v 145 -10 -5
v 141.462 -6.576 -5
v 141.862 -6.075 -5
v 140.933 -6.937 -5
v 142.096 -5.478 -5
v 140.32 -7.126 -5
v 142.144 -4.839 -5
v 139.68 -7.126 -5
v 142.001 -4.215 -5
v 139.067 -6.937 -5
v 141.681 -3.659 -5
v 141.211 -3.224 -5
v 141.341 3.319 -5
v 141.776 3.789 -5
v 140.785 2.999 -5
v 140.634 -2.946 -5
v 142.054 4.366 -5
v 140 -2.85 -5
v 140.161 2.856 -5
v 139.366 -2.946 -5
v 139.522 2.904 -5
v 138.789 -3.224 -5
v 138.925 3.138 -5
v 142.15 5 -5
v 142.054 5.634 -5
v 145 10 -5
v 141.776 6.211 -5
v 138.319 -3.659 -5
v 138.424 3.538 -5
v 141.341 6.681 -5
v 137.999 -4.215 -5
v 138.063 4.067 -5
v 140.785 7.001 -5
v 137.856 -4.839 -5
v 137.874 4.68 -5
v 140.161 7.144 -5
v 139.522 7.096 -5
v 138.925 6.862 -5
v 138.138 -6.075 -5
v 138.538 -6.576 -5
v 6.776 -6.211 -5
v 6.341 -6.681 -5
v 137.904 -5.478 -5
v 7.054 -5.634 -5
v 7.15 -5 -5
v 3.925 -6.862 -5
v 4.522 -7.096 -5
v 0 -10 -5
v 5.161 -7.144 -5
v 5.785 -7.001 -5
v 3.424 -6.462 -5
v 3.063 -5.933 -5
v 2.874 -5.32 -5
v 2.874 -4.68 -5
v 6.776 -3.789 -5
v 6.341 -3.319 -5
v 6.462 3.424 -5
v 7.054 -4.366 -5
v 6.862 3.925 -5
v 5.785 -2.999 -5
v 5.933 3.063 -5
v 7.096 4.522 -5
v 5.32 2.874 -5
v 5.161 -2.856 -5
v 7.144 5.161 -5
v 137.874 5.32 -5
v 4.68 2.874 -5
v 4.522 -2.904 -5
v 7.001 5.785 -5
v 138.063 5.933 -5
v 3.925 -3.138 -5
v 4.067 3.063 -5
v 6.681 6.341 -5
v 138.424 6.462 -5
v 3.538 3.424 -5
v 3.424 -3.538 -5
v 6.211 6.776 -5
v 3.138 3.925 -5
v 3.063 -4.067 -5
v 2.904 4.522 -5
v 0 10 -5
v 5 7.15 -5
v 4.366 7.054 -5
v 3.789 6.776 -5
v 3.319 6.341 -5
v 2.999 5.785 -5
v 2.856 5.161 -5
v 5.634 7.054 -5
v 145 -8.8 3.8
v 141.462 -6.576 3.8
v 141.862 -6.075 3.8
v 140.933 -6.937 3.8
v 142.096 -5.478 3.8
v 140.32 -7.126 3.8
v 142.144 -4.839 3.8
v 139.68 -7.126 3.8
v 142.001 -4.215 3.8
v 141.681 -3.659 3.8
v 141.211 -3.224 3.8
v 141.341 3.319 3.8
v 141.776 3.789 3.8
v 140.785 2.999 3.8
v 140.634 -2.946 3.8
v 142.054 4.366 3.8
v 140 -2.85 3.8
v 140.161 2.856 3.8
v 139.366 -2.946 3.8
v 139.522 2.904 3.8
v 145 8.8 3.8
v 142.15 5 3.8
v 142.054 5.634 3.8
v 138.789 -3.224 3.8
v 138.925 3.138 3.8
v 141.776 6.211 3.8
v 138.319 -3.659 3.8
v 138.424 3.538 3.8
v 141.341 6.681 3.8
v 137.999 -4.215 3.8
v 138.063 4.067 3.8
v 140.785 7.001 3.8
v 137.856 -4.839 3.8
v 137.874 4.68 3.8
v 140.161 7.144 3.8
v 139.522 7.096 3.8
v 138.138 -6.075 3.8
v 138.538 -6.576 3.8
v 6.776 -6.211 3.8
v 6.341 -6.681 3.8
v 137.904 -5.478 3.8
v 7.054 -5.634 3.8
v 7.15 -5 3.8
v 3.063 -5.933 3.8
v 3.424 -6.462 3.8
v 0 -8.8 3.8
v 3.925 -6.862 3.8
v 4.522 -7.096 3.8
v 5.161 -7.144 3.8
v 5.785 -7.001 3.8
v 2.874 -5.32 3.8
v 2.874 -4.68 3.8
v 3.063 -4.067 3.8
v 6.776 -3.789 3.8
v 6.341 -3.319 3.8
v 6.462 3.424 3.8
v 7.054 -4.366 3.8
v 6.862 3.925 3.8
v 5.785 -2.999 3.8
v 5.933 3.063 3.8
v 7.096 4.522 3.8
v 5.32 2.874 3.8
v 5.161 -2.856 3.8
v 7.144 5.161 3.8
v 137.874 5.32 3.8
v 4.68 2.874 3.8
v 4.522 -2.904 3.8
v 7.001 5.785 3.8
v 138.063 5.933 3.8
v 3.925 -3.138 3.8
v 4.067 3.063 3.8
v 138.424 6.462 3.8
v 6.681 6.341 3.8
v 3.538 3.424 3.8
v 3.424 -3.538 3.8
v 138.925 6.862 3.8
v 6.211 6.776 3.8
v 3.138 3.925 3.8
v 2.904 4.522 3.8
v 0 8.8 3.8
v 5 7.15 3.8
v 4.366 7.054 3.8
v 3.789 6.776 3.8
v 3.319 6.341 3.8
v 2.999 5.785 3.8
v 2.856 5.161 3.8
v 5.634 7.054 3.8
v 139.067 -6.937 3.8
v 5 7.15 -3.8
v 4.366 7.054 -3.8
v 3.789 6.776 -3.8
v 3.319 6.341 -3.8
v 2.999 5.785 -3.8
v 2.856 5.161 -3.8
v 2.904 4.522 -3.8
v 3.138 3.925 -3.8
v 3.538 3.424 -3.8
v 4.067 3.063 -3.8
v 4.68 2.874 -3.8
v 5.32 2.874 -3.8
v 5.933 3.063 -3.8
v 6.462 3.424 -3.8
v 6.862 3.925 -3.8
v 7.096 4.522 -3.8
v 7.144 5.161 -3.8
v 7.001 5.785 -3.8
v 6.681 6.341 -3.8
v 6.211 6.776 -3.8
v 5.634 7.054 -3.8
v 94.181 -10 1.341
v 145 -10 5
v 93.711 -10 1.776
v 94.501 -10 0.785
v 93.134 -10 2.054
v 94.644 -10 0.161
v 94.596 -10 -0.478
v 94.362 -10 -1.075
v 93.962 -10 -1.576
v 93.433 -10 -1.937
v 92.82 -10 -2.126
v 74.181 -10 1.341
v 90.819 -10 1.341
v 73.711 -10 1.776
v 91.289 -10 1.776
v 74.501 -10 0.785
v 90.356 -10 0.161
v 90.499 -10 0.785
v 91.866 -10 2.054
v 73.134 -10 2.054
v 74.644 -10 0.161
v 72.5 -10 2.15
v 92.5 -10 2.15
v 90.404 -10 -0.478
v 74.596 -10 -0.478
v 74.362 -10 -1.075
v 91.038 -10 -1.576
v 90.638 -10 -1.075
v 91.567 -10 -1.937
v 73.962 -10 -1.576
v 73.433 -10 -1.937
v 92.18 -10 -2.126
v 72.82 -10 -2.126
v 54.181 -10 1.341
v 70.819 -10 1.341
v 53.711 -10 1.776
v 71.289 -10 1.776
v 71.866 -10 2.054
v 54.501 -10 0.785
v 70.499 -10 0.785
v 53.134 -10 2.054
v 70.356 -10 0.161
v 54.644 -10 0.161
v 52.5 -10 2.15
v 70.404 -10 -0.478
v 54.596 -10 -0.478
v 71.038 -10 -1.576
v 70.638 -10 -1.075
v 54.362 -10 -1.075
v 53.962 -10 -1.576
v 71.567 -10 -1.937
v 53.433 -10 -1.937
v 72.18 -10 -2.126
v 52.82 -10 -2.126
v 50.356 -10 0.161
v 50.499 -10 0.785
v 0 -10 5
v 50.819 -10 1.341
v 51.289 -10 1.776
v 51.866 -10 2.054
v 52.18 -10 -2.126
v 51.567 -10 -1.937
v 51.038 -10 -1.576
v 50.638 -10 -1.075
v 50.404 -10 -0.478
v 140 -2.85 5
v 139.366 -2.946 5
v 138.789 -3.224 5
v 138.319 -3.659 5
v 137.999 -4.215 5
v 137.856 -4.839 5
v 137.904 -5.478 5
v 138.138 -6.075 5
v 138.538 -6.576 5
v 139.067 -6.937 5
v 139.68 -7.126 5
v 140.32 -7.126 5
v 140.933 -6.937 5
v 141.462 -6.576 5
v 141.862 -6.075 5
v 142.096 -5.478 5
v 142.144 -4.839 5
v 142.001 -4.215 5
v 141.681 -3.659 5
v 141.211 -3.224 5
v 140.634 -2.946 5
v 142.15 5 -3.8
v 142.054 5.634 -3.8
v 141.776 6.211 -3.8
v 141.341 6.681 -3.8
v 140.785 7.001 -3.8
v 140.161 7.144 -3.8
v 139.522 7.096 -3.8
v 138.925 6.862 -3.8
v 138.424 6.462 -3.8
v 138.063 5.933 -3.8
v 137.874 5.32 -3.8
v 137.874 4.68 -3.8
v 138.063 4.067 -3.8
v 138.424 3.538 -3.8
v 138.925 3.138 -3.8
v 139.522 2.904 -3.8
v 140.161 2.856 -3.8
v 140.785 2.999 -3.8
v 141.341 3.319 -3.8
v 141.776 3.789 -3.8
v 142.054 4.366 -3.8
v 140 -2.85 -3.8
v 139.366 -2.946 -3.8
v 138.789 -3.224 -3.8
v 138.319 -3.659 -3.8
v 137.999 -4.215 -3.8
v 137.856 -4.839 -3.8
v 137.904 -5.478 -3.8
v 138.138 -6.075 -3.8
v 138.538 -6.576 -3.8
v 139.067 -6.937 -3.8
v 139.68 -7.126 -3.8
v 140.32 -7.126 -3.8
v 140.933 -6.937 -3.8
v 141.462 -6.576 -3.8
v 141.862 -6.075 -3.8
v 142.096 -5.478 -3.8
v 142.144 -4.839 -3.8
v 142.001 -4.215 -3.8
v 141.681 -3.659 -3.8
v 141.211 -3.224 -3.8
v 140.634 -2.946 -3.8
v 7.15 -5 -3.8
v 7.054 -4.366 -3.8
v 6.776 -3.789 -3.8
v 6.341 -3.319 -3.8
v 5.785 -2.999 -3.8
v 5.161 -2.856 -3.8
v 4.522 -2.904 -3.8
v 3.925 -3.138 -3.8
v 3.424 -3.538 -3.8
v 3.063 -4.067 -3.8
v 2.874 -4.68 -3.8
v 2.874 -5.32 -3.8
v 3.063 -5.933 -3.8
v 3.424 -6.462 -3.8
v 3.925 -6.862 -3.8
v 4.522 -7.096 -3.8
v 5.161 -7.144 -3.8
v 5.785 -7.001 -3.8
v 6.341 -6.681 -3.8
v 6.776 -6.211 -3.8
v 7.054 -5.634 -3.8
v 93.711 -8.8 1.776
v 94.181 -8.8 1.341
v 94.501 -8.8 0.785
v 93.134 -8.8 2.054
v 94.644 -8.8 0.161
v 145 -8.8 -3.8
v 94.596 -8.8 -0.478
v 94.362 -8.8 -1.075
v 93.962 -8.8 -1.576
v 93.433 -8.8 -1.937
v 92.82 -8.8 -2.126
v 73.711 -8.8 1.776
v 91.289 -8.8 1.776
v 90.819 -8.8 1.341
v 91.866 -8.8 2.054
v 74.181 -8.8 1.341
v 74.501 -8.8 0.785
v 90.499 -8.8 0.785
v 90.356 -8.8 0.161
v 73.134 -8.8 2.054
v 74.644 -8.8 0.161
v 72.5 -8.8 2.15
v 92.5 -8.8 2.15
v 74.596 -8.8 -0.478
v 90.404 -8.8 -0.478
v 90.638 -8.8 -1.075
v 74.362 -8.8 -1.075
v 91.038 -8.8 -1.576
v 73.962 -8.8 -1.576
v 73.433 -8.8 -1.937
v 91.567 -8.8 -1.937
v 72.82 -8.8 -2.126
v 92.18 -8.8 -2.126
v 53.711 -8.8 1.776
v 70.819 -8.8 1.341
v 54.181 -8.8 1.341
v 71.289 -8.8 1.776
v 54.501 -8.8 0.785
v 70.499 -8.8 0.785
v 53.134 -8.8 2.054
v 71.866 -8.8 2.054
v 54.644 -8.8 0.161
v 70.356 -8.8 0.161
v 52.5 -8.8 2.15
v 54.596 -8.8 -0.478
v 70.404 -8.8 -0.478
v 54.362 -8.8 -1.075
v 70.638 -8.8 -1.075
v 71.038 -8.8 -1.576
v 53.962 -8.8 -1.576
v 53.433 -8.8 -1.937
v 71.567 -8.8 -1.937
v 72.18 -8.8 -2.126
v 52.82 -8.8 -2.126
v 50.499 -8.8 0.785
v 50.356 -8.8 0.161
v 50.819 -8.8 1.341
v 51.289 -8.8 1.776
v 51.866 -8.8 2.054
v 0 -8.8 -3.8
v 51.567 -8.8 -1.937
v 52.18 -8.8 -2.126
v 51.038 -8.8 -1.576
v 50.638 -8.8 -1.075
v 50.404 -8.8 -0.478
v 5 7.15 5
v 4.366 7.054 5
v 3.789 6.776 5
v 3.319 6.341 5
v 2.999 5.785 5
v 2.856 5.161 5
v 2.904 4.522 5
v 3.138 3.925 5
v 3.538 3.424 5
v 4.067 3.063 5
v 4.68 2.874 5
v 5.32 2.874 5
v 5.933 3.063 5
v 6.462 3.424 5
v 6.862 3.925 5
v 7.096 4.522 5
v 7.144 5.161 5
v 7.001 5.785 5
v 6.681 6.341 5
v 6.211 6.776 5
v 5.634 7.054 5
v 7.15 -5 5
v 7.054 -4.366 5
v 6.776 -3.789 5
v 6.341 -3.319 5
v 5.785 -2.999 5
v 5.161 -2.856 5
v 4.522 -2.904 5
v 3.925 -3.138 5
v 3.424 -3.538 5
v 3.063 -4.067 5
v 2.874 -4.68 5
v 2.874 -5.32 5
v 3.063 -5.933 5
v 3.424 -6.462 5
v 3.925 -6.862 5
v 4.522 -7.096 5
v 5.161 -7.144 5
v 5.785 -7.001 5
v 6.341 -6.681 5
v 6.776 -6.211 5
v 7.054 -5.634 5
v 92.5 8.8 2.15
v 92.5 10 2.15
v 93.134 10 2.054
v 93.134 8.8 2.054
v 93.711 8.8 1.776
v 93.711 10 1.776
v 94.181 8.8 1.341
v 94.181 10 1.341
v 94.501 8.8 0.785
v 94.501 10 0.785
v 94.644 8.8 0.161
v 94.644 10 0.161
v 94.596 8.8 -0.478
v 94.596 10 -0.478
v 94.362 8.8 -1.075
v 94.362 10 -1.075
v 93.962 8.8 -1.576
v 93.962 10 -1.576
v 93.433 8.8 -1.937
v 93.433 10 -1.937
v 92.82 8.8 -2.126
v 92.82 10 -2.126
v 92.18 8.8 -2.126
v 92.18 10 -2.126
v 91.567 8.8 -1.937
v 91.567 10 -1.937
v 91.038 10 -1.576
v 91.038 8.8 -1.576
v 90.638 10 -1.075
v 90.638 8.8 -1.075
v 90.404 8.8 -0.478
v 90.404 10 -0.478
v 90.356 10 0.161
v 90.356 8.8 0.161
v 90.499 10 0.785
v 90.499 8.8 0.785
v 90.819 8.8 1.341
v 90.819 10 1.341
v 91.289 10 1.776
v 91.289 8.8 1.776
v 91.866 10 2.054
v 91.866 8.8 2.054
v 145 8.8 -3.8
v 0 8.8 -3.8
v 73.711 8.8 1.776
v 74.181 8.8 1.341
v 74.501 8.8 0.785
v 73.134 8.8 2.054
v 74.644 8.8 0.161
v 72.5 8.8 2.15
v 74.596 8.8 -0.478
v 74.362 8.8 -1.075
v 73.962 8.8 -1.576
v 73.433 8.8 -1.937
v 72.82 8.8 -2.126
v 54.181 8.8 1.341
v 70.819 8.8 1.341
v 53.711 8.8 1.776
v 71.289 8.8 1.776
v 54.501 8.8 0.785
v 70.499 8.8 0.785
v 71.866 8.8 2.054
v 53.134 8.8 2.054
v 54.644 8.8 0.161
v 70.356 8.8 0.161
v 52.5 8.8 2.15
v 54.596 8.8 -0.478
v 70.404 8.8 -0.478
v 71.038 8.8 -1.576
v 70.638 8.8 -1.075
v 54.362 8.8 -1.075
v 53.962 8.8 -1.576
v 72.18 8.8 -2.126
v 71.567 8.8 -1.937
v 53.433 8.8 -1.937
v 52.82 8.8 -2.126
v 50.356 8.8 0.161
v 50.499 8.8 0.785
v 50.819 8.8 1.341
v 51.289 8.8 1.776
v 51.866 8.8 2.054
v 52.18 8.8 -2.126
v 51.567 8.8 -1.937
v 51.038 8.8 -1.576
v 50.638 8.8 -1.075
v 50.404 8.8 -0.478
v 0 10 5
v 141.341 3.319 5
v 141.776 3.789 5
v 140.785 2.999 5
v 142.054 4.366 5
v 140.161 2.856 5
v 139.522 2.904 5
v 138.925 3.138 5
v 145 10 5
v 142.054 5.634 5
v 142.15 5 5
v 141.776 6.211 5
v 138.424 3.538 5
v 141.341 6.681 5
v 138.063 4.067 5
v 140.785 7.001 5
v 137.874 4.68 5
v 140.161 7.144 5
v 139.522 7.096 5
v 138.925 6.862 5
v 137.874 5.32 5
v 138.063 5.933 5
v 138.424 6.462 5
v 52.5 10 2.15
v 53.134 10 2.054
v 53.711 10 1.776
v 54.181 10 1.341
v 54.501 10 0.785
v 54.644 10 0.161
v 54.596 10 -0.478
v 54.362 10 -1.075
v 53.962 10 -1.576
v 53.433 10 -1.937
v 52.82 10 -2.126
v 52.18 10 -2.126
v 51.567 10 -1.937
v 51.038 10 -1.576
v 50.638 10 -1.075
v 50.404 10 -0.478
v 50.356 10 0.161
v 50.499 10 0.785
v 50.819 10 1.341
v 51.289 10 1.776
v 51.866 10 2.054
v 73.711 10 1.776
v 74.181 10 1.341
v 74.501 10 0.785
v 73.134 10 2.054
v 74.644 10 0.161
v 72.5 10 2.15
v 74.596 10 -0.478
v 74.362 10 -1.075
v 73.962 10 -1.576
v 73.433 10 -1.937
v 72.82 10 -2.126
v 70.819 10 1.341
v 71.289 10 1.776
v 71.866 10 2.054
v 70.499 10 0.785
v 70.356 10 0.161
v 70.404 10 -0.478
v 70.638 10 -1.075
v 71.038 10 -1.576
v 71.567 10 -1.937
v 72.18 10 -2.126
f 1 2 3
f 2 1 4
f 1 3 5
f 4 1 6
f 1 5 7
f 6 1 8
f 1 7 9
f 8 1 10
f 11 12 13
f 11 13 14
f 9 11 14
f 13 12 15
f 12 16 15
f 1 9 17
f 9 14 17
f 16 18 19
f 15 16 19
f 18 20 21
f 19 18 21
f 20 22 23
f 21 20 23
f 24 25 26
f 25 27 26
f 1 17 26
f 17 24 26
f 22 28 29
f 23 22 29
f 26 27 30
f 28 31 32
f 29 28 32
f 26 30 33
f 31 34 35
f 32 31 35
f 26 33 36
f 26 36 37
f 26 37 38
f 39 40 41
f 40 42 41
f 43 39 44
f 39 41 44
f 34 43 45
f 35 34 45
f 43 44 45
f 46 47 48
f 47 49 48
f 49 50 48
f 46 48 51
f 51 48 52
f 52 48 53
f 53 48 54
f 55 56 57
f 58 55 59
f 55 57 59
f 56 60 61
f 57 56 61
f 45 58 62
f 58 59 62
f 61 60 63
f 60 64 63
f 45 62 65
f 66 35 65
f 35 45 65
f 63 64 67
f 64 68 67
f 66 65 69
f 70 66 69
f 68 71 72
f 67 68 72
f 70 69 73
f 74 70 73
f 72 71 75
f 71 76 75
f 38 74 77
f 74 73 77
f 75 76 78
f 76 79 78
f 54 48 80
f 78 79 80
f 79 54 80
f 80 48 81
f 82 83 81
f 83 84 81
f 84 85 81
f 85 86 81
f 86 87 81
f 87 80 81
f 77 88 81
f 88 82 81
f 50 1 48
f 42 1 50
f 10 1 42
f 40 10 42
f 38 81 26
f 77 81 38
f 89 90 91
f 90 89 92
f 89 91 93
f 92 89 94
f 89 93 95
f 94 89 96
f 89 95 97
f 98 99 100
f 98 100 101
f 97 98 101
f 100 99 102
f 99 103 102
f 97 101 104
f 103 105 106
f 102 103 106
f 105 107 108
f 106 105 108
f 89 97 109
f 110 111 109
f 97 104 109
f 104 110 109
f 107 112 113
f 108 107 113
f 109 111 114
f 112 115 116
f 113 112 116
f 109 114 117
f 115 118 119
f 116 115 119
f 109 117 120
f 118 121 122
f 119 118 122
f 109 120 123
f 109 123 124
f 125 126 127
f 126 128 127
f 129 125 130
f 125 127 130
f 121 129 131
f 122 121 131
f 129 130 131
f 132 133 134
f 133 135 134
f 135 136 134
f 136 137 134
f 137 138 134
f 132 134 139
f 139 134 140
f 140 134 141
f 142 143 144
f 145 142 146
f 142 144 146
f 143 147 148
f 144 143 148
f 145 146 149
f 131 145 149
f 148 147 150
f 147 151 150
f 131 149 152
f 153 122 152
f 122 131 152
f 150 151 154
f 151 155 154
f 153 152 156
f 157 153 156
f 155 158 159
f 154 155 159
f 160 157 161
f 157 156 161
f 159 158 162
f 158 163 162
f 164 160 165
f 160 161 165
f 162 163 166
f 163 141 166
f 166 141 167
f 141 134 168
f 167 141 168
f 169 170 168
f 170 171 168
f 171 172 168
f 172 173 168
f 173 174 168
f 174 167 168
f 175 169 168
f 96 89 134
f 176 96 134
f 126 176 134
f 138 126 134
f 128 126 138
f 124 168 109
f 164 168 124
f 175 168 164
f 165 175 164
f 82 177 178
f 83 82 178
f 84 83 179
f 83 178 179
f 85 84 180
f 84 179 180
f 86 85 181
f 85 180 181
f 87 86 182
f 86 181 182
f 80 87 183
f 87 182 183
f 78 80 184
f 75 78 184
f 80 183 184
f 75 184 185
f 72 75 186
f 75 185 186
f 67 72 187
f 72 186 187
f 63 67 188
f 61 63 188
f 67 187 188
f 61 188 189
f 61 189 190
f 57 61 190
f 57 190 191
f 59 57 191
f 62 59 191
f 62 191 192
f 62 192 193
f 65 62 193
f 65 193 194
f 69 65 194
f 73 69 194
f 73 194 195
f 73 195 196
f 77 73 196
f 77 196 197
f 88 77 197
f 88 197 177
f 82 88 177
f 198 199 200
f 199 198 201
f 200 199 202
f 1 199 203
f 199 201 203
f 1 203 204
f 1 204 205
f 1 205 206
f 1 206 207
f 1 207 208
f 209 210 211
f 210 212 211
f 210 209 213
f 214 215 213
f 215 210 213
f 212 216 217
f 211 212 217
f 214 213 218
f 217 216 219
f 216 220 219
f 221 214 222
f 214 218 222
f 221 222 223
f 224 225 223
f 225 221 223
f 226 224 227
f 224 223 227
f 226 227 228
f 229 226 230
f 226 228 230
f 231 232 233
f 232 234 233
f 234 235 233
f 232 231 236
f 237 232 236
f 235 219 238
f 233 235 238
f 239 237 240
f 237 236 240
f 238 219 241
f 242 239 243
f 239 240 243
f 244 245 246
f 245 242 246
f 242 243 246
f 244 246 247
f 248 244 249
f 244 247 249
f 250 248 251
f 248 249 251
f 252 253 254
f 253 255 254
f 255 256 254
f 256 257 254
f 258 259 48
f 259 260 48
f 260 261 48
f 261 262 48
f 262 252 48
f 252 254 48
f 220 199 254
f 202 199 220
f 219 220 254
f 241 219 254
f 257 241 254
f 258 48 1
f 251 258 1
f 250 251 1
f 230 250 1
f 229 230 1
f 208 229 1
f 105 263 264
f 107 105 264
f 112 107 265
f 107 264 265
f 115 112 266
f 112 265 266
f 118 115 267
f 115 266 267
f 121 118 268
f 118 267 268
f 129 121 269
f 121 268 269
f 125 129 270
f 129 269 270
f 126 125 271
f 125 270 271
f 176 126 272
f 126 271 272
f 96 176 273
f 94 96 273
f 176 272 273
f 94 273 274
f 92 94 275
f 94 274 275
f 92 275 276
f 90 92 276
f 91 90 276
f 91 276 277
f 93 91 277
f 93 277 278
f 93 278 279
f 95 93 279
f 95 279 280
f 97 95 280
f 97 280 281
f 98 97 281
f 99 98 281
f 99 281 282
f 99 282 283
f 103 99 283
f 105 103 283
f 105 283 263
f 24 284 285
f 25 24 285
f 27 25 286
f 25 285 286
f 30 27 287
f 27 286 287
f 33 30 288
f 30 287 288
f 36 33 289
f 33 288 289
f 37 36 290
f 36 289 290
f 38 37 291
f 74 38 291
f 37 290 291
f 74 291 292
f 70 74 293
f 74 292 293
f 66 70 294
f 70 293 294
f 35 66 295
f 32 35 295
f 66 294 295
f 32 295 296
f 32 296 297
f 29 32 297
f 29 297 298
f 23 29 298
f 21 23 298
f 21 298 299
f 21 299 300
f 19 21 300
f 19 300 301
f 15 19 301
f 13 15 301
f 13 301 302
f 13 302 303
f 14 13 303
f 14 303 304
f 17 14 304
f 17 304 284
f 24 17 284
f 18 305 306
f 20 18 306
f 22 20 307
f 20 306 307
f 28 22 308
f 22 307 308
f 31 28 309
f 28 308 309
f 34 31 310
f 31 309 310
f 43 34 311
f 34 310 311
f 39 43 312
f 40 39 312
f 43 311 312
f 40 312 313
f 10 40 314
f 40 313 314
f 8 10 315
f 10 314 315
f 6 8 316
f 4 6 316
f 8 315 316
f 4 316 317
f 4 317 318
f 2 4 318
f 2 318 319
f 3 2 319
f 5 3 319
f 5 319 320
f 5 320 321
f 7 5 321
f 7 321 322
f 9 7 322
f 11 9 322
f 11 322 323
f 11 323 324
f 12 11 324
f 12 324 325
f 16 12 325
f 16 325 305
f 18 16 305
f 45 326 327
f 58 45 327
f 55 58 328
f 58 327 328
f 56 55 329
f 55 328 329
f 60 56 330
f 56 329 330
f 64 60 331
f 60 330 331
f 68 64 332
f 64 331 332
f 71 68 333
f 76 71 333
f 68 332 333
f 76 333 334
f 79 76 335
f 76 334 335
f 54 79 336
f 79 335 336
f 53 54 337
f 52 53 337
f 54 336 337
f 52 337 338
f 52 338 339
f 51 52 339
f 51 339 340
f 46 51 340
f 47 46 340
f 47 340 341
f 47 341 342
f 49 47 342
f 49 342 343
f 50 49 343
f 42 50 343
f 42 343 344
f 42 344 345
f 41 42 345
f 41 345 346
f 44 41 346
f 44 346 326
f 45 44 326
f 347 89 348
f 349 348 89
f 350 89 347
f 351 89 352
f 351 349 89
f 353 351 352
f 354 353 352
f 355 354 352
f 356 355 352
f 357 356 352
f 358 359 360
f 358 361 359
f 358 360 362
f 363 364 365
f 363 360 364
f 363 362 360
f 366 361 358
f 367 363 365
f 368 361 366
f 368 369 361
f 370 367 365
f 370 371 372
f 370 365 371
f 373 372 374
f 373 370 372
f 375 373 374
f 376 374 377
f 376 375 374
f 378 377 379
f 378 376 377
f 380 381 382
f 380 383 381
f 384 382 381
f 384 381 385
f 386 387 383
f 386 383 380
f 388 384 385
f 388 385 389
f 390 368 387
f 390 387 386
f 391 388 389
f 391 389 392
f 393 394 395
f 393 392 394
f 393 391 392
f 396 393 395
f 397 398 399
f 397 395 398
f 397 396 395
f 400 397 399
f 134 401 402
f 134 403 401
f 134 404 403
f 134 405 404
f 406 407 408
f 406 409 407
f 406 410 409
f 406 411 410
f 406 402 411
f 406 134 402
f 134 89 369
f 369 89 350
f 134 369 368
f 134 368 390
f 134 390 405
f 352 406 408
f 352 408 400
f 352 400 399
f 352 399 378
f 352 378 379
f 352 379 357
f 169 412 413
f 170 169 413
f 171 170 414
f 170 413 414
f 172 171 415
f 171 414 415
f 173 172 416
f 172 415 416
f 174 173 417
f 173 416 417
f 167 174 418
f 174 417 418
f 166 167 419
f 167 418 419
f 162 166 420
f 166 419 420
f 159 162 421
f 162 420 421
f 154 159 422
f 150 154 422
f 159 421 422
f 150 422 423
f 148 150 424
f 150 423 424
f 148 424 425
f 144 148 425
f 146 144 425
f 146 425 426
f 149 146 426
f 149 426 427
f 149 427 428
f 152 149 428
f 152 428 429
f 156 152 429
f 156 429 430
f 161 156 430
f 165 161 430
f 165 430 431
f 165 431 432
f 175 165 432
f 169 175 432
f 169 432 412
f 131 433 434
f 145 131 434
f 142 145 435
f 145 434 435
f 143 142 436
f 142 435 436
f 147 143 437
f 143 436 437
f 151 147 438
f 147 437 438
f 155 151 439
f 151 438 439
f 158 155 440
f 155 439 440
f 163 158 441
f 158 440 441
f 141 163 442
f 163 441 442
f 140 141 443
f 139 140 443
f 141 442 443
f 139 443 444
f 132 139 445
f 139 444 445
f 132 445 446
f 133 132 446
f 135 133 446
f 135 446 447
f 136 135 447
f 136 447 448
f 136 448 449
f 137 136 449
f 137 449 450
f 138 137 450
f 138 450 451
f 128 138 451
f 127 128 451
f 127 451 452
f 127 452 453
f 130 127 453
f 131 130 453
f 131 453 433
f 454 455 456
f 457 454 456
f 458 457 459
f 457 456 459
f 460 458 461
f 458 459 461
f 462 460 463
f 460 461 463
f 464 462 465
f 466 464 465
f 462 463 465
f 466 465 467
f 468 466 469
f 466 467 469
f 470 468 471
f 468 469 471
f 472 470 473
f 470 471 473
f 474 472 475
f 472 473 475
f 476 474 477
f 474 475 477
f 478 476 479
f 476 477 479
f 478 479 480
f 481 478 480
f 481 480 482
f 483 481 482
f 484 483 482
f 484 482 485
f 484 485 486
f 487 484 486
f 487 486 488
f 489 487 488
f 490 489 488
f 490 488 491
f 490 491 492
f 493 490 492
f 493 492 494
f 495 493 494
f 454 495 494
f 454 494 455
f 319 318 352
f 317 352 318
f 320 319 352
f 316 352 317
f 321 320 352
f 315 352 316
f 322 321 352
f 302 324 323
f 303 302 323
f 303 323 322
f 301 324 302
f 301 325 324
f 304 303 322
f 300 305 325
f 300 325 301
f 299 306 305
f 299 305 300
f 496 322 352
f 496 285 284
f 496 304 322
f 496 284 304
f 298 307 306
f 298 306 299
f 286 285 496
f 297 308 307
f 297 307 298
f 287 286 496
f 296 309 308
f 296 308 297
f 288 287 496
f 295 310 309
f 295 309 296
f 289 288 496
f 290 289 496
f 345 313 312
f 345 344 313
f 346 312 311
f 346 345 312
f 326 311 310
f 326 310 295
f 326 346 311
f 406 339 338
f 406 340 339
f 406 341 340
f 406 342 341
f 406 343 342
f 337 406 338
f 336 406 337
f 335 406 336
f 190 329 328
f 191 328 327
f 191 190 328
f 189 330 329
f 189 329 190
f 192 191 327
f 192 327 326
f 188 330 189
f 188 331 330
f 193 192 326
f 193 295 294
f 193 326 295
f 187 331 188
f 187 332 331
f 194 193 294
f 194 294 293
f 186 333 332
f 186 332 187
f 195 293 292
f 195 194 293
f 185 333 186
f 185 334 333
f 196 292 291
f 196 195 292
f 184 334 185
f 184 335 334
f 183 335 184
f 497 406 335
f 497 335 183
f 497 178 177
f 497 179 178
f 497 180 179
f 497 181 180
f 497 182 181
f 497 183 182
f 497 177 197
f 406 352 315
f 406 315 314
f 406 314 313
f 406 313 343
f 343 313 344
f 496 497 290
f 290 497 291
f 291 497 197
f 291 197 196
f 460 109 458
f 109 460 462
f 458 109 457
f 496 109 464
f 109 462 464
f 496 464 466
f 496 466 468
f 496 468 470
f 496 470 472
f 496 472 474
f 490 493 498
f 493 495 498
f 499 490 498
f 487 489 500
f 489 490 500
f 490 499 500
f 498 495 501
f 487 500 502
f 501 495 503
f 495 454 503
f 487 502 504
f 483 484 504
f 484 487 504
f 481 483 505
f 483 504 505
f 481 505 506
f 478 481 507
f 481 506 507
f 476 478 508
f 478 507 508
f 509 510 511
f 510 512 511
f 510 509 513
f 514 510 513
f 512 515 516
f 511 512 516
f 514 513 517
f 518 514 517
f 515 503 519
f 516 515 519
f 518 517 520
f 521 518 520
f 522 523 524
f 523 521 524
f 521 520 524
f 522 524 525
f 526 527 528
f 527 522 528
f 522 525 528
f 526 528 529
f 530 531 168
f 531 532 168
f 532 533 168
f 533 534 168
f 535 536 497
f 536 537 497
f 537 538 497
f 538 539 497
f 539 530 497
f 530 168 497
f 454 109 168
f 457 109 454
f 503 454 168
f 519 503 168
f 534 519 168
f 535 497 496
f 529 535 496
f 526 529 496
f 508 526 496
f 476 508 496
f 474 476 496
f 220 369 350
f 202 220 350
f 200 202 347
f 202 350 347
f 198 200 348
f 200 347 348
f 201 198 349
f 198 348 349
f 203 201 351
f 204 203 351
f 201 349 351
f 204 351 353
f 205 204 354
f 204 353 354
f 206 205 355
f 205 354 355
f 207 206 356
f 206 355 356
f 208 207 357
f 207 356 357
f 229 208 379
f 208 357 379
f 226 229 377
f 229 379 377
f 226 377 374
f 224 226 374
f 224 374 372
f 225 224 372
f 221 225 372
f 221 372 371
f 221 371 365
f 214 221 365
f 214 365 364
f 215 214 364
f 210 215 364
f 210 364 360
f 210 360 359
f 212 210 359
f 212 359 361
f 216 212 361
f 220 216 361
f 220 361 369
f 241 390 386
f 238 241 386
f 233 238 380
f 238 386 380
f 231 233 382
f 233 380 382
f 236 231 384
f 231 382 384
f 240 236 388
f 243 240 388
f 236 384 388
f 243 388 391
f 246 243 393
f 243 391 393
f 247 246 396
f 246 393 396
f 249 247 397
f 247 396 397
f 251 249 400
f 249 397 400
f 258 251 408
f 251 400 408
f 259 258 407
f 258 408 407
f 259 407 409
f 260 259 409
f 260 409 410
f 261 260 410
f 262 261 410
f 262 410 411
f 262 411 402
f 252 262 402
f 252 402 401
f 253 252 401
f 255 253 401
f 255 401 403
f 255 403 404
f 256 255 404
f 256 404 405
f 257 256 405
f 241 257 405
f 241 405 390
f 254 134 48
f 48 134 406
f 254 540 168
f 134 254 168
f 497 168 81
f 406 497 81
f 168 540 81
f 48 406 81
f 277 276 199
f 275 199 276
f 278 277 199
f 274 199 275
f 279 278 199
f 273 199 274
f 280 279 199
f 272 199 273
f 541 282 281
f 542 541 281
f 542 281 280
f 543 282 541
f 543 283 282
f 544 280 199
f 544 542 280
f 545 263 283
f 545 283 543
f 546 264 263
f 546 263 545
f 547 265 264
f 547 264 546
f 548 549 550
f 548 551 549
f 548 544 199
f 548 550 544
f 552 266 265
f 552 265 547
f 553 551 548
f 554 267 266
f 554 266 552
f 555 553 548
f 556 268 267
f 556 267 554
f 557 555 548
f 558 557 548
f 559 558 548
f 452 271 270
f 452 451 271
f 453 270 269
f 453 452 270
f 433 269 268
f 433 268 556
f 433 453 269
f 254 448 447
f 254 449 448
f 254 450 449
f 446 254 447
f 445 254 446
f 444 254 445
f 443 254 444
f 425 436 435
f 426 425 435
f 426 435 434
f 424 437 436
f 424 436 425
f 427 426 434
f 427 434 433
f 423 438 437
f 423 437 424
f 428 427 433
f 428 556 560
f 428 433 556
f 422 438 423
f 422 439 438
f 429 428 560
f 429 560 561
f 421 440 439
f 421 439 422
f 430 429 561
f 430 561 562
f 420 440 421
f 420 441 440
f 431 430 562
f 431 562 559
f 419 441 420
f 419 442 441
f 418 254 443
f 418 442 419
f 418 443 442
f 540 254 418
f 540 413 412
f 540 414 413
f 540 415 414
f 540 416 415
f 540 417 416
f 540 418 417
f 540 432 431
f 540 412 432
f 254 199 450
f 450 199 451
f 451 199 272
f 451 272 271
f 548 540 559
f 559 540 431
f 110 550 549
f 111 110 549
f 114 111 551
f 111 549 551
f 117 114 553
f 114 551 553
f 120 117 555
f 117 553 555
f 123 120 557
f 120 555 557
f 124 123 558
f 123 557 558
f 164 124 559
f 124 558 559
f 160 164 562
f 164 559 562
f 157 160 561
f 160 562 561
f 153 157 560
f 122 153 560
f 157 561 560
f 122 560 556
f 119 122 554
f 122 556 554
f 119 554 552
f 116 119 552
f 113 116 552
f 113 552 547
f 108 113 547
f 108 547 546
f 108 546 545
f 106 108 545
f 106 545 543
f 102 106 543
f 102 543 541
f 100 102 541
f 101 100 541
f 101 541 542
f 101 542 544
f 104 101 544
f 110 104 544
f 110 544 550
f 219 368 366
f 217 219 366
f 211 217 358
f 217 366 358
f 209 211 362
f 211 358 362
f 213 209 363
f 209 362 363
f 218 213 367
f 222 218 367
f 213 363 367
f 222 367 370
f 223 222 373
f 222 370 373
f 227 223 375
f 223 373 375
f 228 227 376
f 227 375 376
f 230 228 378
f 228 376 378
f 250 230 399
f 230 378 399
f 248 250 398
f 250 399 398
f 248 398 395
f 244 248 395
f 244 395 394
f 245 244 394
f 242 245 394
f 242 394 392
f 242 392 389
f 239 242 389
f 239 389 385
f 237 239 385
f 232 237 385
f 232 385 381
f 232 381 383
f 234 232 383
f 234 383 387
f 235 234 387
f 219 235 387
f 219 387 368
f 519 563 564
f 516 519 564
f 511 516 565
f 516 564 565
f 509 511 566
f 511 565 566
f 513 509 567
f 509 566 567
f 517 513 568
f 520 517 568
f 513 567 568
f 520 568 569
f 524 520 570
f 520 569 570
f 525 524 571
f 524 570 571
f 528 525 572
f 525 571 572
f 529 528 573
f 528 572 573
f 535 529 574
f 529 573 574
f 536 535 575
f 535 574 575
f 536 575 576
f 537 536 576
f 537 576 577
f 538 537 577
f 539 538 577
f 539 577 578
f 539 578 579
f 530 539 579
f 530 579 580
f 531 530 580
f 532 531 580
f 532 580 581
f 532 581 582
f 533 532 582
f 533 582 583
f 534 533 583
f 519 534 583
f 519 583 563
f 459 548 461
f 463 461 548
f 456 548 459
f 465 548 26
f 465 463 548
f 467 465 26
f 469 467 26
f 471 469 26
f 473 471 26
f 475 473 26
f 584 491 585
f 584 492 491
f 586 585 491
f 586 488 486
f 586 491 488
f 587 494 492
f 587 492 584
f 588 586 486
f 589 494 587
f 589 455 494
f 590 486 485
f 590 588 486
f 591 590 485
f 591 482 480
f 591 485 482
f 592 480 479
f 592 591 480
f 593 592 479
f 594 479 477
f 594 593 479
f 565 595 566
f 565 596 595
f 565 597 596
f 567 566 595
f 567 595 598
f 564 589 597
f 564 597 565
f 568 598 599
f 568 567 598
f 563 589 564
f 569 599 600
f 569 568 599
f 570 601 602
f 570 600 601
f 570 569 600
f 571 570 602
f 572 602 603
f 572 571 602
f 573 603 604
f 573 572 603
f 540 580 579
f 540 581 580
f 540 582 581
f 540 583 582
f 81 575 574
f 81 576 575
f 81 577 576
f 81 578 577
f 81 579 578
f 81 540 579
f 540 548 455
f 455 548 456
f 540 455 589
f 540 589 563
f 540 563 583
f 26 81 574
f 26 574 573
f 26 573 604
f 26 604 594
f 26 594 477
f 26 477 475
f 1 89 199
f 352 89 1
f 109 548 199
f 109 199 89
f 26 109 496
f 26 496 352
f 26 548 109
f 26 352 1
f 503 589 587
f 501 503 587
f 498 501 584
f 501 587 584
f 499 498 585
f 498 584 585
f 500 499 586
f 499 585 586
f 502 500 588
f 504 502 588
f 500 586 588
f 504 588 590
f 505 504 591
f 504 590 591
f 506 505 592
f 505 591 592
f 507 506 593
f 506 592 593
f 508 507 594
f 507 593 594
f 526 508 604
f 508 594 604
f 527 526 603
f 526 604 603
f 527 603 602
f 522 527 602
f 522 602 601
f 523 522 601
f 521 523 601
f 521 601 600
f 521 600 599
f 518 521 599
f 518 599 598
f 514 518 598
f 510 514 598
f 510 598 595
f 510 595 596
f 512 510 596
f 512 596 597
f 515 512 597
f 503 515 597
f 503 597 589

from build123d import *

# Parameters (mm, degrees)
SKETCH_1_W          = 10
SKETCH_1_H          = 20
SKETCH_1_W_2        = 7.6
SKETCH_1_H_2        = 17.6
EXTRUDE_1_DEPTH     = 145
SKETCH_3_R          = 2.15
CUT_EXTRUDE_1_DEPTH = 147.458185159
SKETCH_4_R          = 2.15
CUT_EXTRUDE_2_DEPTH = 146.688022843


with BuildPart() as part:
    # ｽｹｯﾁ1 → 押し出し-薄板1 (new body)
    with BuildSketch(Plane(origin=(0, 0, 0), x_dir=(0, 0, -1), z_dir=(1, 0, 0))):
        Rectangle(SKETCH_1_W, SKETCH_1_H)
        Rectangle(SKETCH_1_W_2, SKETCH_1_H_2, mode=Mode.SUBTRACT)
    extrude(amount=EXTRUDE_1_DEPTH)

    # ｽｹｯﾁ3 → ｶｯﾄ - 押し出し1 (cut, through all)
    with BuildSketch(Plane(origin=(0, 10, 0), x_dir=(1, 0, 0), z_dir=(0, 1, 0))):
        with Locations(Location((92.5, 0, 0), (0, 0, 270))):
            Circle(SKETCH_3_R)
        with Locations(Location((52.5, 0, 0), (0, 0, 270))):
            Circle(SKETCH_3_R)
        with Locations(Location((72.5, 0, 0), (0, 0, 270))):
            Circle(SKETCH_3_R)
    extrude(amount=-CUT_EXTRUDE_1_DEPTH, mode=Mode.SUBTRACT)

    # ｽｹｯﾁ4 → ｶｯﾄ - 押し出し2 (cut, through all)
    with BuildSketch(Plane.XY.offset(5)):
        with Locations((140, 5)):
            Circle(SKETCH_4_R)
        with Locations(Location((140, -5, 0), (0, 0, 90))):
            Circle(SKETCH_4_R)
        with Locations(Location((5, 5, 0), (0, 0, 90))):
            Circle(SKETCH_4_R)
        with Locations((5, -5)):
            Circle(SKETCH_4_R)
    extrude(amount=-CUT_EXTRUDE_2_DEPTH, mode=Mode.SUBTRACT)


solid = part.part
